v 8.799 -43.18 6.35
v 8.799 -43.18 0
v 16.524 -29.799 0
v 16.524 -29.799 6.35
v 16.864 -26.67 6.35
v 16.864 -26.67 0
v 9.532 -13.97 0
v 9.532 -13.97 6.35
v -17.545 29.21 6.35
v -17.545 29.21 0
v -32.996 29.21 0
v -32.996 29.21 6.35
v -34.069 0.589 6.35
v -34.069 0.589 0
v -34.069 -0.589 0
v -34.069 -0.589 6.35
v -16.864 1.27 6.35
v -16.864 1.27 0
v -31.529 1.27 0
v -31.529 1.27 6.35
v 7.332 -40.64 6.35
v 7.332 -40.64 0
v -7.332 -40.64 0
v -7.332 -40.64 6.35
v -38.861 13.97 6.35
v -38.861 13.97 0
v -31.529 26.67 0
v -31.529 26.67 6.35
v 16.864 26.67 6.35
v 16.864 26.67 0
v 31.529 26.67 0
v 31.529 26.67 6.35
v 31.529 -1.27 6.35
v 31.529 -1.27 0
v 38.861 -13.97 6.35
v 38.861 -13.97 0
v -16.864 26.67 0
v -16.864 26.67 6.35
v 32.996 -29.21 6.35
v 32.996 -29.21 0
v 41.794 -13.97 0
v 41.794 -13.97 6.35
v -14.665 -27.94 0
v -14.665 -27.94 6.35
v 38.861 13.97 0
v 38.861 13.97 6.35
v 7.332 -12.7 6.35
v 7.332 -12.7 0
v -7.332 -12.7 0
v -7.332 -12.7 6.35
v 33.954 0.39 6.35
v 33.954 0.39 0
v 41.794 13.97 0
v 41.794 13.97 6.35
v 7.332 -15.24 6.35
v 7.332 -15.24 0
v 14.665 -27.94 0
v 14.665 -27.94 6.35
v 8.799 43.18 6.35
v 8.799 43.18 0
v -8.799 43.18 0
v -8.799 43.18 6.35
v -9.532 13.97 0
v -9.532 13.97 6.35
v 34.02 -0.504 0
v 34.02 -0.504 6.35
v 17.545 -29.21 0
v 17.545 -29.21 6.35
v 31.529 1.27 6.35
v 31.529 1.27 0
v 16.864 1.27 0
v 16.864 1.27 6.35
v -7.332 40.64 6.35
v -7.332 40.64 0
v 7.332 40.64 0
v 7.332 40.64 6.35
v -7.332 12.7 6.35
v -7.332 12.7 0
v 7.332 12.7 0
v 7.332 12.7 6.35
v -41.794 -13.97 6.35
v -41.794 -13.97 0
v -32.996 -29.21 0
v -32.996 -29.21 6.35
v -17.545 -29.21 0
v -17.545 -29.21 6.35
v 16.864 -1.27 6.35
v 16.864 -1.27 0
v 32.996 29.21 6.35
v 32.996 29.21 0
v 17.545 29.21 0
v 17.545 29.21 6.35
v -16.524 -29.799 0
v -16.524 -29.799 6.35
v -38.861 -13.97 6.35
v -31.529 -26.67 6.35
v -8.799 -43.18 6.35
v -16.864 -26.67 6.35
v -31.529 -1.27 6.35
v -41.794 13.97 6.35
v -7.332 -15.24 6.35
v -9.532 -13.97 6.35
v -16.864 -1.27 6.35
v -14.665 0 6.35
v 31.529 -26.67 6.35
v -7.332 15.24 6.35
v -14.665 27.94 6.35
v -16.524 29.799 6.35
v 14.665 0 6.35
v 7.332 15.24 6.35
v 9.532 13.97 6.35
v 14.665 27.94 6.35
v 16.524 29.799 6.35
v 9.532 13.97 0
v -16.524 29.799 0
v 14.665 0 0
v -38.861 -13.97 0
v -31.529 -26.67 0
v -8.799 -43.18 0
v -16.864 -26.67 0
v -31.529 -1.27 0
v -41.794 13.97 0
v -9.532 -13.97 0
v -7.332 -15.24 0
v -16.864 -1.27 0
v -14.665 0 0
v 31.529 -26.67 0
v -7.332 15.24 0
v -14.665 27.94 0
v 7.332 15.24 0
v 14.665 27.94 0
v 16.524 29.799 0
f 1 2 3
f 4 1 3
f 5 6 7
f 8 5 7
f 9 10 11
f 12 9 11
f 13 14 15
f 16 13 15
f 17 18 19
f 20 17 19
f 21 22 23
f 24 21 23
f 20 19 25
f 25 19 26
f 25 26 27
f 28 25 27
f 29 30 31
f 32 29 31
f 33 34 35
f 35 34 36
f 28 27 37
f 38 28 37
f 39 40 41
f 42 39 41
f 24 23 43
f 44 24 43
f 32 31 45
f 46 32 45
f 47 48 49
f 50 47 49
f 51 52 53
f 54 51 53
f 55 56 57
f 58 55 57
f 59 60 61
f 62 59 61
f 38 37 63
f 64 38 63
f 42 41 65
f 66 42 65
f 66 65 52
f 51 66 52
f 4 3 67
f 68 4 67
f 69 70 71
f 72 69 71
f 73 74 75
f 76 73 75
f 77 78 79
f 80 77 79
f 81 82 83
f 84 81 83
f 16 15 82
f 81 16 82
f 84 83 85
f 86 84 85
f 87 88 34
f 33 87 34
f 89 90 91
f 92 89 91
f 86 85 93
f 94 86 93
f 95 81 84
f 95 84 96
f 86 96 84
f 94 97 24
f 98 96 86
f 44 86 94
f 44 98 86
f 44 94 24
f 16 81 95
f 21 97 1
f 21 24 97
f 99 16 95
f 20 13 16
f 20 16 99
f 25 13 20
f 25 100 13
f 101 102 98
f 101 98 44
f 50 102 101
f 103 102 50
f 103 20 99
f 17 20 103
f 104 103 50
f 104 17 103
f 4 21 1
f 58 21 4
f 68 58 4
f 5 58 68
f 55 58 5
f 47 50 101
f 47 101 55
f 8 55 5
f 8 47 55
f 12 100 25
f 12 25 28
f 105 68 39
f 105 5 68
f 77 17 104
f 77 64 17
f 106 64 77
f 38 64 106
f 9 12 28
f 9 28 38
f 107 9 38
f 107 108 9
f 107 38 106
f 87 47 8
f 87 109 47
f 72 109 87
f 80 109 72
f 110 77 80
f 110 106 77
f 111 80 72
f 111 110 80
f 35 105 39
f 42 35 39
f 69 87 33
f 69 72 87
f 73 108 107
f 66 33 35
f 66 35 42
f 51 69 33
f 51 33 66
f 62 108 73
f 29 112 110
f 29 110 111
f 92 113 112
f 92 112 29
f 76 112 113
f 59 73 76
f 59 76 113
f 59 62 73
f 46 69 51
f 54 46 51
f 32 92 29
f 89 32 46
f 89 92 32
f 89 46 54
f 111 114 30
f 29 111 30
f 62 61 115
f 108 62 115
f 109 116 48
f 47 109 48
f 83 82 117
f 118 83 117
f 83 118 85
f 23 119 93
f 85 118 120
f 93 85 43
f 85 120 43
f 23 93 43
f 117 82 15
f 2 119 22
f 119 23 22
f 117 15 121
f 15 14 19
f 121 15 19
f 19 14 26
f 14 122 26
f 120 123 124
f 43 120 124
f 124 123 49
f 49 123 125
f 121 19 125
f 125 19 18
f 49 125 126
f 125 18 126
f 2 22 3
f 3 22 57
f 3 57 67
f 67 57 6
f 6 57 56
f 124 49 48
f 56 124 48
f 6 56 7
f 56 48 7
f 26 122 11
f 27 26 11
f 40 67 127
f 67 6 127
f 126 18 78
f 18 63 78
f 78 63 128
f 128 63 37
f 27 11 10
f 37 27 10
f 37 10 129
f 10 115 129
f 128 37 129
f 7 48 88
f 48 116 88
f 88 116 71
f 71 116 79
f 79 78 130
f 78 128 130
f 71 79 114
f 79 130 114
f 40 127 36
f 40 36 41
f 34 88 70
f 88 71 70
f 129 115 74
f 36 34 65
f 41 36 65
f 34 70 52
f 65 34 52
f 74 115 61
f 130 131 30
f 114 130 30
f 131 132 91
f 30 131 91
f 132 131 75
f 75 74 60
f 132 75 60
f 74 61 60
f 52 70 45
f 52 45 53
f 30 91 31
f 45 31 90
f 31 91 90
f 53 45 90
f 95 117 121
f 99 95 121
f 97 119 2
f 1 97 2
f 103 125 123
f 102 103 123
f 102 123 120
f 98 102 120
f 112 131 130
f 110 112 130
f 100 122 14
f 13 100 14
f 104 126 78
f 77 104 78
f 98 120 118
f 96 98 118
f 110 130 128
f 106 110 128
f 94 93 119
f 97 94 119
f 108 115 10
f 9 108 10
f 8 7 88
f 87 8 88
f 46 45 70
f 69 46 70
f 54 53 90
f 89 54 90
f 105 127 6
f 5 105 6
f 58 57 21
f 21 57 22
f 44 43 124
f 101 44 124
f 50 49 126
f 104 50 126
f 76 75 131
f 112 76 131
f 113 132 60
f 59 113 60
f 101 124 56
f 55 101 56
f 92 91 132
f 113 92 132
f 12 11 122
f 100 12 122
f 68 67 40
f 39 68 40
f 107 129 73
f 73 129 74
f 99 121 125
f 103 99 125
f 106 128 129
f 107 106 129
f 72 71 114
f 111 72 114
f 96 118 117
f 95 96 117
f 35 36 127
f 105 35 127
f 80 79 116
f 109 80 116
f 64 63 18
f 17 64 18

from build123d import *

# Parameters (mm, degrees)
F1_DEPTH = 6.35


with BuildPart() as f1:
    # F0 (on Top) → F1 (new body)
    with BuildSketch(Plane.XY):
        Polygon((31.529098, 26.67), (16.864401, 26.67), (9.532053, 13.97), (16.864401, 1.27), (31.342068, 1.27), (31.529098, 1.27), (38.861447, 13.97), align=None)
        Polygon((41.794386, 13.97), (32.995568, 29.21), (17.544992, 29.21), (16.524106, 29.799409), (8.798818, 43.18), (-8.798818, 43.18), (-16.524106, 29.799409), (-17.544992, 29.21), (-32.995568, 29.21), (-41.794386, 13.97), (-34.069098, 0.589409), (-34.069098, -0.589409), (-41.794386, -13.97), (-32.995568, -29.21), (-17.544992, -29.21), (-16.524106, -29.799409), (-8.798818, -43.18), (8.798818, -43.18), (16.524106, -29.799409), (17.544992, -29.21), (32.995568, -29.21), (41.794386, -13.97), (34.01954, -0.503571), (33.953768, 0.389652), align=None)
        Polygon((7.332348, -15.24), (14.664697, -27.94), (7.332348, -40.64), (-7.332348, -40.64), (-14.664697, -27.94), (-7.332348, -15.24), align=None, mode=Mode.SUBTRACT)
        Polygon((-9.532053, -13.97), (-16.864401, -26.67), (-31.529098, -26.67), (-38.861447, -13.97), (-31.529098, -1.27), (-16.864401, -1.27), align=None, mode=Mode.SUBTRACT)
        Polygon((16.864401, -1.27), (31.529098, -1.27), (38.861447, -13.97), (31.529098, -26.67), (16.864401, -26.67), (9.532053, -13.97), align=None, mode=Mode.SUBTRACT)
        Polygon((-16.864401, 1.27), (-31.529098, 1.27), (-38.861447, 13.97), (-31.529098, 26.67), (-16.864401, 26.67), (-9.532053, 13.97), align=None, mode=Mode.SUBTRACT)
        Polygon((14.664697, 0), (7.332348, -12.7), (-7.332348, -12.7), (-14.664697, 0), (-7.332348, 12.7), (7.332348, 12.7), align=None, mode=Mode.SUBTRACT)
        Polygon((9.532053, 13.97), (16.864401, 26.67), (31.529098, 26.67), (38.861447, 13.97), (31.529098, 1.27), (31.342068, 1.27), (16.864401, 1.27), align=None, mode=Mode.SUBTRACT)
        Polygon((14.664697, 27.94), (7.332348, 15.24), (-7.332348, 15.24), (-14.664697, 27.94), (-7.332348, 40.64), (7.332348, 40.64), align=None, mode=Mode.SUBTRACT)
    extrude(amount=F1_DEPTH)


solid = f1.part
